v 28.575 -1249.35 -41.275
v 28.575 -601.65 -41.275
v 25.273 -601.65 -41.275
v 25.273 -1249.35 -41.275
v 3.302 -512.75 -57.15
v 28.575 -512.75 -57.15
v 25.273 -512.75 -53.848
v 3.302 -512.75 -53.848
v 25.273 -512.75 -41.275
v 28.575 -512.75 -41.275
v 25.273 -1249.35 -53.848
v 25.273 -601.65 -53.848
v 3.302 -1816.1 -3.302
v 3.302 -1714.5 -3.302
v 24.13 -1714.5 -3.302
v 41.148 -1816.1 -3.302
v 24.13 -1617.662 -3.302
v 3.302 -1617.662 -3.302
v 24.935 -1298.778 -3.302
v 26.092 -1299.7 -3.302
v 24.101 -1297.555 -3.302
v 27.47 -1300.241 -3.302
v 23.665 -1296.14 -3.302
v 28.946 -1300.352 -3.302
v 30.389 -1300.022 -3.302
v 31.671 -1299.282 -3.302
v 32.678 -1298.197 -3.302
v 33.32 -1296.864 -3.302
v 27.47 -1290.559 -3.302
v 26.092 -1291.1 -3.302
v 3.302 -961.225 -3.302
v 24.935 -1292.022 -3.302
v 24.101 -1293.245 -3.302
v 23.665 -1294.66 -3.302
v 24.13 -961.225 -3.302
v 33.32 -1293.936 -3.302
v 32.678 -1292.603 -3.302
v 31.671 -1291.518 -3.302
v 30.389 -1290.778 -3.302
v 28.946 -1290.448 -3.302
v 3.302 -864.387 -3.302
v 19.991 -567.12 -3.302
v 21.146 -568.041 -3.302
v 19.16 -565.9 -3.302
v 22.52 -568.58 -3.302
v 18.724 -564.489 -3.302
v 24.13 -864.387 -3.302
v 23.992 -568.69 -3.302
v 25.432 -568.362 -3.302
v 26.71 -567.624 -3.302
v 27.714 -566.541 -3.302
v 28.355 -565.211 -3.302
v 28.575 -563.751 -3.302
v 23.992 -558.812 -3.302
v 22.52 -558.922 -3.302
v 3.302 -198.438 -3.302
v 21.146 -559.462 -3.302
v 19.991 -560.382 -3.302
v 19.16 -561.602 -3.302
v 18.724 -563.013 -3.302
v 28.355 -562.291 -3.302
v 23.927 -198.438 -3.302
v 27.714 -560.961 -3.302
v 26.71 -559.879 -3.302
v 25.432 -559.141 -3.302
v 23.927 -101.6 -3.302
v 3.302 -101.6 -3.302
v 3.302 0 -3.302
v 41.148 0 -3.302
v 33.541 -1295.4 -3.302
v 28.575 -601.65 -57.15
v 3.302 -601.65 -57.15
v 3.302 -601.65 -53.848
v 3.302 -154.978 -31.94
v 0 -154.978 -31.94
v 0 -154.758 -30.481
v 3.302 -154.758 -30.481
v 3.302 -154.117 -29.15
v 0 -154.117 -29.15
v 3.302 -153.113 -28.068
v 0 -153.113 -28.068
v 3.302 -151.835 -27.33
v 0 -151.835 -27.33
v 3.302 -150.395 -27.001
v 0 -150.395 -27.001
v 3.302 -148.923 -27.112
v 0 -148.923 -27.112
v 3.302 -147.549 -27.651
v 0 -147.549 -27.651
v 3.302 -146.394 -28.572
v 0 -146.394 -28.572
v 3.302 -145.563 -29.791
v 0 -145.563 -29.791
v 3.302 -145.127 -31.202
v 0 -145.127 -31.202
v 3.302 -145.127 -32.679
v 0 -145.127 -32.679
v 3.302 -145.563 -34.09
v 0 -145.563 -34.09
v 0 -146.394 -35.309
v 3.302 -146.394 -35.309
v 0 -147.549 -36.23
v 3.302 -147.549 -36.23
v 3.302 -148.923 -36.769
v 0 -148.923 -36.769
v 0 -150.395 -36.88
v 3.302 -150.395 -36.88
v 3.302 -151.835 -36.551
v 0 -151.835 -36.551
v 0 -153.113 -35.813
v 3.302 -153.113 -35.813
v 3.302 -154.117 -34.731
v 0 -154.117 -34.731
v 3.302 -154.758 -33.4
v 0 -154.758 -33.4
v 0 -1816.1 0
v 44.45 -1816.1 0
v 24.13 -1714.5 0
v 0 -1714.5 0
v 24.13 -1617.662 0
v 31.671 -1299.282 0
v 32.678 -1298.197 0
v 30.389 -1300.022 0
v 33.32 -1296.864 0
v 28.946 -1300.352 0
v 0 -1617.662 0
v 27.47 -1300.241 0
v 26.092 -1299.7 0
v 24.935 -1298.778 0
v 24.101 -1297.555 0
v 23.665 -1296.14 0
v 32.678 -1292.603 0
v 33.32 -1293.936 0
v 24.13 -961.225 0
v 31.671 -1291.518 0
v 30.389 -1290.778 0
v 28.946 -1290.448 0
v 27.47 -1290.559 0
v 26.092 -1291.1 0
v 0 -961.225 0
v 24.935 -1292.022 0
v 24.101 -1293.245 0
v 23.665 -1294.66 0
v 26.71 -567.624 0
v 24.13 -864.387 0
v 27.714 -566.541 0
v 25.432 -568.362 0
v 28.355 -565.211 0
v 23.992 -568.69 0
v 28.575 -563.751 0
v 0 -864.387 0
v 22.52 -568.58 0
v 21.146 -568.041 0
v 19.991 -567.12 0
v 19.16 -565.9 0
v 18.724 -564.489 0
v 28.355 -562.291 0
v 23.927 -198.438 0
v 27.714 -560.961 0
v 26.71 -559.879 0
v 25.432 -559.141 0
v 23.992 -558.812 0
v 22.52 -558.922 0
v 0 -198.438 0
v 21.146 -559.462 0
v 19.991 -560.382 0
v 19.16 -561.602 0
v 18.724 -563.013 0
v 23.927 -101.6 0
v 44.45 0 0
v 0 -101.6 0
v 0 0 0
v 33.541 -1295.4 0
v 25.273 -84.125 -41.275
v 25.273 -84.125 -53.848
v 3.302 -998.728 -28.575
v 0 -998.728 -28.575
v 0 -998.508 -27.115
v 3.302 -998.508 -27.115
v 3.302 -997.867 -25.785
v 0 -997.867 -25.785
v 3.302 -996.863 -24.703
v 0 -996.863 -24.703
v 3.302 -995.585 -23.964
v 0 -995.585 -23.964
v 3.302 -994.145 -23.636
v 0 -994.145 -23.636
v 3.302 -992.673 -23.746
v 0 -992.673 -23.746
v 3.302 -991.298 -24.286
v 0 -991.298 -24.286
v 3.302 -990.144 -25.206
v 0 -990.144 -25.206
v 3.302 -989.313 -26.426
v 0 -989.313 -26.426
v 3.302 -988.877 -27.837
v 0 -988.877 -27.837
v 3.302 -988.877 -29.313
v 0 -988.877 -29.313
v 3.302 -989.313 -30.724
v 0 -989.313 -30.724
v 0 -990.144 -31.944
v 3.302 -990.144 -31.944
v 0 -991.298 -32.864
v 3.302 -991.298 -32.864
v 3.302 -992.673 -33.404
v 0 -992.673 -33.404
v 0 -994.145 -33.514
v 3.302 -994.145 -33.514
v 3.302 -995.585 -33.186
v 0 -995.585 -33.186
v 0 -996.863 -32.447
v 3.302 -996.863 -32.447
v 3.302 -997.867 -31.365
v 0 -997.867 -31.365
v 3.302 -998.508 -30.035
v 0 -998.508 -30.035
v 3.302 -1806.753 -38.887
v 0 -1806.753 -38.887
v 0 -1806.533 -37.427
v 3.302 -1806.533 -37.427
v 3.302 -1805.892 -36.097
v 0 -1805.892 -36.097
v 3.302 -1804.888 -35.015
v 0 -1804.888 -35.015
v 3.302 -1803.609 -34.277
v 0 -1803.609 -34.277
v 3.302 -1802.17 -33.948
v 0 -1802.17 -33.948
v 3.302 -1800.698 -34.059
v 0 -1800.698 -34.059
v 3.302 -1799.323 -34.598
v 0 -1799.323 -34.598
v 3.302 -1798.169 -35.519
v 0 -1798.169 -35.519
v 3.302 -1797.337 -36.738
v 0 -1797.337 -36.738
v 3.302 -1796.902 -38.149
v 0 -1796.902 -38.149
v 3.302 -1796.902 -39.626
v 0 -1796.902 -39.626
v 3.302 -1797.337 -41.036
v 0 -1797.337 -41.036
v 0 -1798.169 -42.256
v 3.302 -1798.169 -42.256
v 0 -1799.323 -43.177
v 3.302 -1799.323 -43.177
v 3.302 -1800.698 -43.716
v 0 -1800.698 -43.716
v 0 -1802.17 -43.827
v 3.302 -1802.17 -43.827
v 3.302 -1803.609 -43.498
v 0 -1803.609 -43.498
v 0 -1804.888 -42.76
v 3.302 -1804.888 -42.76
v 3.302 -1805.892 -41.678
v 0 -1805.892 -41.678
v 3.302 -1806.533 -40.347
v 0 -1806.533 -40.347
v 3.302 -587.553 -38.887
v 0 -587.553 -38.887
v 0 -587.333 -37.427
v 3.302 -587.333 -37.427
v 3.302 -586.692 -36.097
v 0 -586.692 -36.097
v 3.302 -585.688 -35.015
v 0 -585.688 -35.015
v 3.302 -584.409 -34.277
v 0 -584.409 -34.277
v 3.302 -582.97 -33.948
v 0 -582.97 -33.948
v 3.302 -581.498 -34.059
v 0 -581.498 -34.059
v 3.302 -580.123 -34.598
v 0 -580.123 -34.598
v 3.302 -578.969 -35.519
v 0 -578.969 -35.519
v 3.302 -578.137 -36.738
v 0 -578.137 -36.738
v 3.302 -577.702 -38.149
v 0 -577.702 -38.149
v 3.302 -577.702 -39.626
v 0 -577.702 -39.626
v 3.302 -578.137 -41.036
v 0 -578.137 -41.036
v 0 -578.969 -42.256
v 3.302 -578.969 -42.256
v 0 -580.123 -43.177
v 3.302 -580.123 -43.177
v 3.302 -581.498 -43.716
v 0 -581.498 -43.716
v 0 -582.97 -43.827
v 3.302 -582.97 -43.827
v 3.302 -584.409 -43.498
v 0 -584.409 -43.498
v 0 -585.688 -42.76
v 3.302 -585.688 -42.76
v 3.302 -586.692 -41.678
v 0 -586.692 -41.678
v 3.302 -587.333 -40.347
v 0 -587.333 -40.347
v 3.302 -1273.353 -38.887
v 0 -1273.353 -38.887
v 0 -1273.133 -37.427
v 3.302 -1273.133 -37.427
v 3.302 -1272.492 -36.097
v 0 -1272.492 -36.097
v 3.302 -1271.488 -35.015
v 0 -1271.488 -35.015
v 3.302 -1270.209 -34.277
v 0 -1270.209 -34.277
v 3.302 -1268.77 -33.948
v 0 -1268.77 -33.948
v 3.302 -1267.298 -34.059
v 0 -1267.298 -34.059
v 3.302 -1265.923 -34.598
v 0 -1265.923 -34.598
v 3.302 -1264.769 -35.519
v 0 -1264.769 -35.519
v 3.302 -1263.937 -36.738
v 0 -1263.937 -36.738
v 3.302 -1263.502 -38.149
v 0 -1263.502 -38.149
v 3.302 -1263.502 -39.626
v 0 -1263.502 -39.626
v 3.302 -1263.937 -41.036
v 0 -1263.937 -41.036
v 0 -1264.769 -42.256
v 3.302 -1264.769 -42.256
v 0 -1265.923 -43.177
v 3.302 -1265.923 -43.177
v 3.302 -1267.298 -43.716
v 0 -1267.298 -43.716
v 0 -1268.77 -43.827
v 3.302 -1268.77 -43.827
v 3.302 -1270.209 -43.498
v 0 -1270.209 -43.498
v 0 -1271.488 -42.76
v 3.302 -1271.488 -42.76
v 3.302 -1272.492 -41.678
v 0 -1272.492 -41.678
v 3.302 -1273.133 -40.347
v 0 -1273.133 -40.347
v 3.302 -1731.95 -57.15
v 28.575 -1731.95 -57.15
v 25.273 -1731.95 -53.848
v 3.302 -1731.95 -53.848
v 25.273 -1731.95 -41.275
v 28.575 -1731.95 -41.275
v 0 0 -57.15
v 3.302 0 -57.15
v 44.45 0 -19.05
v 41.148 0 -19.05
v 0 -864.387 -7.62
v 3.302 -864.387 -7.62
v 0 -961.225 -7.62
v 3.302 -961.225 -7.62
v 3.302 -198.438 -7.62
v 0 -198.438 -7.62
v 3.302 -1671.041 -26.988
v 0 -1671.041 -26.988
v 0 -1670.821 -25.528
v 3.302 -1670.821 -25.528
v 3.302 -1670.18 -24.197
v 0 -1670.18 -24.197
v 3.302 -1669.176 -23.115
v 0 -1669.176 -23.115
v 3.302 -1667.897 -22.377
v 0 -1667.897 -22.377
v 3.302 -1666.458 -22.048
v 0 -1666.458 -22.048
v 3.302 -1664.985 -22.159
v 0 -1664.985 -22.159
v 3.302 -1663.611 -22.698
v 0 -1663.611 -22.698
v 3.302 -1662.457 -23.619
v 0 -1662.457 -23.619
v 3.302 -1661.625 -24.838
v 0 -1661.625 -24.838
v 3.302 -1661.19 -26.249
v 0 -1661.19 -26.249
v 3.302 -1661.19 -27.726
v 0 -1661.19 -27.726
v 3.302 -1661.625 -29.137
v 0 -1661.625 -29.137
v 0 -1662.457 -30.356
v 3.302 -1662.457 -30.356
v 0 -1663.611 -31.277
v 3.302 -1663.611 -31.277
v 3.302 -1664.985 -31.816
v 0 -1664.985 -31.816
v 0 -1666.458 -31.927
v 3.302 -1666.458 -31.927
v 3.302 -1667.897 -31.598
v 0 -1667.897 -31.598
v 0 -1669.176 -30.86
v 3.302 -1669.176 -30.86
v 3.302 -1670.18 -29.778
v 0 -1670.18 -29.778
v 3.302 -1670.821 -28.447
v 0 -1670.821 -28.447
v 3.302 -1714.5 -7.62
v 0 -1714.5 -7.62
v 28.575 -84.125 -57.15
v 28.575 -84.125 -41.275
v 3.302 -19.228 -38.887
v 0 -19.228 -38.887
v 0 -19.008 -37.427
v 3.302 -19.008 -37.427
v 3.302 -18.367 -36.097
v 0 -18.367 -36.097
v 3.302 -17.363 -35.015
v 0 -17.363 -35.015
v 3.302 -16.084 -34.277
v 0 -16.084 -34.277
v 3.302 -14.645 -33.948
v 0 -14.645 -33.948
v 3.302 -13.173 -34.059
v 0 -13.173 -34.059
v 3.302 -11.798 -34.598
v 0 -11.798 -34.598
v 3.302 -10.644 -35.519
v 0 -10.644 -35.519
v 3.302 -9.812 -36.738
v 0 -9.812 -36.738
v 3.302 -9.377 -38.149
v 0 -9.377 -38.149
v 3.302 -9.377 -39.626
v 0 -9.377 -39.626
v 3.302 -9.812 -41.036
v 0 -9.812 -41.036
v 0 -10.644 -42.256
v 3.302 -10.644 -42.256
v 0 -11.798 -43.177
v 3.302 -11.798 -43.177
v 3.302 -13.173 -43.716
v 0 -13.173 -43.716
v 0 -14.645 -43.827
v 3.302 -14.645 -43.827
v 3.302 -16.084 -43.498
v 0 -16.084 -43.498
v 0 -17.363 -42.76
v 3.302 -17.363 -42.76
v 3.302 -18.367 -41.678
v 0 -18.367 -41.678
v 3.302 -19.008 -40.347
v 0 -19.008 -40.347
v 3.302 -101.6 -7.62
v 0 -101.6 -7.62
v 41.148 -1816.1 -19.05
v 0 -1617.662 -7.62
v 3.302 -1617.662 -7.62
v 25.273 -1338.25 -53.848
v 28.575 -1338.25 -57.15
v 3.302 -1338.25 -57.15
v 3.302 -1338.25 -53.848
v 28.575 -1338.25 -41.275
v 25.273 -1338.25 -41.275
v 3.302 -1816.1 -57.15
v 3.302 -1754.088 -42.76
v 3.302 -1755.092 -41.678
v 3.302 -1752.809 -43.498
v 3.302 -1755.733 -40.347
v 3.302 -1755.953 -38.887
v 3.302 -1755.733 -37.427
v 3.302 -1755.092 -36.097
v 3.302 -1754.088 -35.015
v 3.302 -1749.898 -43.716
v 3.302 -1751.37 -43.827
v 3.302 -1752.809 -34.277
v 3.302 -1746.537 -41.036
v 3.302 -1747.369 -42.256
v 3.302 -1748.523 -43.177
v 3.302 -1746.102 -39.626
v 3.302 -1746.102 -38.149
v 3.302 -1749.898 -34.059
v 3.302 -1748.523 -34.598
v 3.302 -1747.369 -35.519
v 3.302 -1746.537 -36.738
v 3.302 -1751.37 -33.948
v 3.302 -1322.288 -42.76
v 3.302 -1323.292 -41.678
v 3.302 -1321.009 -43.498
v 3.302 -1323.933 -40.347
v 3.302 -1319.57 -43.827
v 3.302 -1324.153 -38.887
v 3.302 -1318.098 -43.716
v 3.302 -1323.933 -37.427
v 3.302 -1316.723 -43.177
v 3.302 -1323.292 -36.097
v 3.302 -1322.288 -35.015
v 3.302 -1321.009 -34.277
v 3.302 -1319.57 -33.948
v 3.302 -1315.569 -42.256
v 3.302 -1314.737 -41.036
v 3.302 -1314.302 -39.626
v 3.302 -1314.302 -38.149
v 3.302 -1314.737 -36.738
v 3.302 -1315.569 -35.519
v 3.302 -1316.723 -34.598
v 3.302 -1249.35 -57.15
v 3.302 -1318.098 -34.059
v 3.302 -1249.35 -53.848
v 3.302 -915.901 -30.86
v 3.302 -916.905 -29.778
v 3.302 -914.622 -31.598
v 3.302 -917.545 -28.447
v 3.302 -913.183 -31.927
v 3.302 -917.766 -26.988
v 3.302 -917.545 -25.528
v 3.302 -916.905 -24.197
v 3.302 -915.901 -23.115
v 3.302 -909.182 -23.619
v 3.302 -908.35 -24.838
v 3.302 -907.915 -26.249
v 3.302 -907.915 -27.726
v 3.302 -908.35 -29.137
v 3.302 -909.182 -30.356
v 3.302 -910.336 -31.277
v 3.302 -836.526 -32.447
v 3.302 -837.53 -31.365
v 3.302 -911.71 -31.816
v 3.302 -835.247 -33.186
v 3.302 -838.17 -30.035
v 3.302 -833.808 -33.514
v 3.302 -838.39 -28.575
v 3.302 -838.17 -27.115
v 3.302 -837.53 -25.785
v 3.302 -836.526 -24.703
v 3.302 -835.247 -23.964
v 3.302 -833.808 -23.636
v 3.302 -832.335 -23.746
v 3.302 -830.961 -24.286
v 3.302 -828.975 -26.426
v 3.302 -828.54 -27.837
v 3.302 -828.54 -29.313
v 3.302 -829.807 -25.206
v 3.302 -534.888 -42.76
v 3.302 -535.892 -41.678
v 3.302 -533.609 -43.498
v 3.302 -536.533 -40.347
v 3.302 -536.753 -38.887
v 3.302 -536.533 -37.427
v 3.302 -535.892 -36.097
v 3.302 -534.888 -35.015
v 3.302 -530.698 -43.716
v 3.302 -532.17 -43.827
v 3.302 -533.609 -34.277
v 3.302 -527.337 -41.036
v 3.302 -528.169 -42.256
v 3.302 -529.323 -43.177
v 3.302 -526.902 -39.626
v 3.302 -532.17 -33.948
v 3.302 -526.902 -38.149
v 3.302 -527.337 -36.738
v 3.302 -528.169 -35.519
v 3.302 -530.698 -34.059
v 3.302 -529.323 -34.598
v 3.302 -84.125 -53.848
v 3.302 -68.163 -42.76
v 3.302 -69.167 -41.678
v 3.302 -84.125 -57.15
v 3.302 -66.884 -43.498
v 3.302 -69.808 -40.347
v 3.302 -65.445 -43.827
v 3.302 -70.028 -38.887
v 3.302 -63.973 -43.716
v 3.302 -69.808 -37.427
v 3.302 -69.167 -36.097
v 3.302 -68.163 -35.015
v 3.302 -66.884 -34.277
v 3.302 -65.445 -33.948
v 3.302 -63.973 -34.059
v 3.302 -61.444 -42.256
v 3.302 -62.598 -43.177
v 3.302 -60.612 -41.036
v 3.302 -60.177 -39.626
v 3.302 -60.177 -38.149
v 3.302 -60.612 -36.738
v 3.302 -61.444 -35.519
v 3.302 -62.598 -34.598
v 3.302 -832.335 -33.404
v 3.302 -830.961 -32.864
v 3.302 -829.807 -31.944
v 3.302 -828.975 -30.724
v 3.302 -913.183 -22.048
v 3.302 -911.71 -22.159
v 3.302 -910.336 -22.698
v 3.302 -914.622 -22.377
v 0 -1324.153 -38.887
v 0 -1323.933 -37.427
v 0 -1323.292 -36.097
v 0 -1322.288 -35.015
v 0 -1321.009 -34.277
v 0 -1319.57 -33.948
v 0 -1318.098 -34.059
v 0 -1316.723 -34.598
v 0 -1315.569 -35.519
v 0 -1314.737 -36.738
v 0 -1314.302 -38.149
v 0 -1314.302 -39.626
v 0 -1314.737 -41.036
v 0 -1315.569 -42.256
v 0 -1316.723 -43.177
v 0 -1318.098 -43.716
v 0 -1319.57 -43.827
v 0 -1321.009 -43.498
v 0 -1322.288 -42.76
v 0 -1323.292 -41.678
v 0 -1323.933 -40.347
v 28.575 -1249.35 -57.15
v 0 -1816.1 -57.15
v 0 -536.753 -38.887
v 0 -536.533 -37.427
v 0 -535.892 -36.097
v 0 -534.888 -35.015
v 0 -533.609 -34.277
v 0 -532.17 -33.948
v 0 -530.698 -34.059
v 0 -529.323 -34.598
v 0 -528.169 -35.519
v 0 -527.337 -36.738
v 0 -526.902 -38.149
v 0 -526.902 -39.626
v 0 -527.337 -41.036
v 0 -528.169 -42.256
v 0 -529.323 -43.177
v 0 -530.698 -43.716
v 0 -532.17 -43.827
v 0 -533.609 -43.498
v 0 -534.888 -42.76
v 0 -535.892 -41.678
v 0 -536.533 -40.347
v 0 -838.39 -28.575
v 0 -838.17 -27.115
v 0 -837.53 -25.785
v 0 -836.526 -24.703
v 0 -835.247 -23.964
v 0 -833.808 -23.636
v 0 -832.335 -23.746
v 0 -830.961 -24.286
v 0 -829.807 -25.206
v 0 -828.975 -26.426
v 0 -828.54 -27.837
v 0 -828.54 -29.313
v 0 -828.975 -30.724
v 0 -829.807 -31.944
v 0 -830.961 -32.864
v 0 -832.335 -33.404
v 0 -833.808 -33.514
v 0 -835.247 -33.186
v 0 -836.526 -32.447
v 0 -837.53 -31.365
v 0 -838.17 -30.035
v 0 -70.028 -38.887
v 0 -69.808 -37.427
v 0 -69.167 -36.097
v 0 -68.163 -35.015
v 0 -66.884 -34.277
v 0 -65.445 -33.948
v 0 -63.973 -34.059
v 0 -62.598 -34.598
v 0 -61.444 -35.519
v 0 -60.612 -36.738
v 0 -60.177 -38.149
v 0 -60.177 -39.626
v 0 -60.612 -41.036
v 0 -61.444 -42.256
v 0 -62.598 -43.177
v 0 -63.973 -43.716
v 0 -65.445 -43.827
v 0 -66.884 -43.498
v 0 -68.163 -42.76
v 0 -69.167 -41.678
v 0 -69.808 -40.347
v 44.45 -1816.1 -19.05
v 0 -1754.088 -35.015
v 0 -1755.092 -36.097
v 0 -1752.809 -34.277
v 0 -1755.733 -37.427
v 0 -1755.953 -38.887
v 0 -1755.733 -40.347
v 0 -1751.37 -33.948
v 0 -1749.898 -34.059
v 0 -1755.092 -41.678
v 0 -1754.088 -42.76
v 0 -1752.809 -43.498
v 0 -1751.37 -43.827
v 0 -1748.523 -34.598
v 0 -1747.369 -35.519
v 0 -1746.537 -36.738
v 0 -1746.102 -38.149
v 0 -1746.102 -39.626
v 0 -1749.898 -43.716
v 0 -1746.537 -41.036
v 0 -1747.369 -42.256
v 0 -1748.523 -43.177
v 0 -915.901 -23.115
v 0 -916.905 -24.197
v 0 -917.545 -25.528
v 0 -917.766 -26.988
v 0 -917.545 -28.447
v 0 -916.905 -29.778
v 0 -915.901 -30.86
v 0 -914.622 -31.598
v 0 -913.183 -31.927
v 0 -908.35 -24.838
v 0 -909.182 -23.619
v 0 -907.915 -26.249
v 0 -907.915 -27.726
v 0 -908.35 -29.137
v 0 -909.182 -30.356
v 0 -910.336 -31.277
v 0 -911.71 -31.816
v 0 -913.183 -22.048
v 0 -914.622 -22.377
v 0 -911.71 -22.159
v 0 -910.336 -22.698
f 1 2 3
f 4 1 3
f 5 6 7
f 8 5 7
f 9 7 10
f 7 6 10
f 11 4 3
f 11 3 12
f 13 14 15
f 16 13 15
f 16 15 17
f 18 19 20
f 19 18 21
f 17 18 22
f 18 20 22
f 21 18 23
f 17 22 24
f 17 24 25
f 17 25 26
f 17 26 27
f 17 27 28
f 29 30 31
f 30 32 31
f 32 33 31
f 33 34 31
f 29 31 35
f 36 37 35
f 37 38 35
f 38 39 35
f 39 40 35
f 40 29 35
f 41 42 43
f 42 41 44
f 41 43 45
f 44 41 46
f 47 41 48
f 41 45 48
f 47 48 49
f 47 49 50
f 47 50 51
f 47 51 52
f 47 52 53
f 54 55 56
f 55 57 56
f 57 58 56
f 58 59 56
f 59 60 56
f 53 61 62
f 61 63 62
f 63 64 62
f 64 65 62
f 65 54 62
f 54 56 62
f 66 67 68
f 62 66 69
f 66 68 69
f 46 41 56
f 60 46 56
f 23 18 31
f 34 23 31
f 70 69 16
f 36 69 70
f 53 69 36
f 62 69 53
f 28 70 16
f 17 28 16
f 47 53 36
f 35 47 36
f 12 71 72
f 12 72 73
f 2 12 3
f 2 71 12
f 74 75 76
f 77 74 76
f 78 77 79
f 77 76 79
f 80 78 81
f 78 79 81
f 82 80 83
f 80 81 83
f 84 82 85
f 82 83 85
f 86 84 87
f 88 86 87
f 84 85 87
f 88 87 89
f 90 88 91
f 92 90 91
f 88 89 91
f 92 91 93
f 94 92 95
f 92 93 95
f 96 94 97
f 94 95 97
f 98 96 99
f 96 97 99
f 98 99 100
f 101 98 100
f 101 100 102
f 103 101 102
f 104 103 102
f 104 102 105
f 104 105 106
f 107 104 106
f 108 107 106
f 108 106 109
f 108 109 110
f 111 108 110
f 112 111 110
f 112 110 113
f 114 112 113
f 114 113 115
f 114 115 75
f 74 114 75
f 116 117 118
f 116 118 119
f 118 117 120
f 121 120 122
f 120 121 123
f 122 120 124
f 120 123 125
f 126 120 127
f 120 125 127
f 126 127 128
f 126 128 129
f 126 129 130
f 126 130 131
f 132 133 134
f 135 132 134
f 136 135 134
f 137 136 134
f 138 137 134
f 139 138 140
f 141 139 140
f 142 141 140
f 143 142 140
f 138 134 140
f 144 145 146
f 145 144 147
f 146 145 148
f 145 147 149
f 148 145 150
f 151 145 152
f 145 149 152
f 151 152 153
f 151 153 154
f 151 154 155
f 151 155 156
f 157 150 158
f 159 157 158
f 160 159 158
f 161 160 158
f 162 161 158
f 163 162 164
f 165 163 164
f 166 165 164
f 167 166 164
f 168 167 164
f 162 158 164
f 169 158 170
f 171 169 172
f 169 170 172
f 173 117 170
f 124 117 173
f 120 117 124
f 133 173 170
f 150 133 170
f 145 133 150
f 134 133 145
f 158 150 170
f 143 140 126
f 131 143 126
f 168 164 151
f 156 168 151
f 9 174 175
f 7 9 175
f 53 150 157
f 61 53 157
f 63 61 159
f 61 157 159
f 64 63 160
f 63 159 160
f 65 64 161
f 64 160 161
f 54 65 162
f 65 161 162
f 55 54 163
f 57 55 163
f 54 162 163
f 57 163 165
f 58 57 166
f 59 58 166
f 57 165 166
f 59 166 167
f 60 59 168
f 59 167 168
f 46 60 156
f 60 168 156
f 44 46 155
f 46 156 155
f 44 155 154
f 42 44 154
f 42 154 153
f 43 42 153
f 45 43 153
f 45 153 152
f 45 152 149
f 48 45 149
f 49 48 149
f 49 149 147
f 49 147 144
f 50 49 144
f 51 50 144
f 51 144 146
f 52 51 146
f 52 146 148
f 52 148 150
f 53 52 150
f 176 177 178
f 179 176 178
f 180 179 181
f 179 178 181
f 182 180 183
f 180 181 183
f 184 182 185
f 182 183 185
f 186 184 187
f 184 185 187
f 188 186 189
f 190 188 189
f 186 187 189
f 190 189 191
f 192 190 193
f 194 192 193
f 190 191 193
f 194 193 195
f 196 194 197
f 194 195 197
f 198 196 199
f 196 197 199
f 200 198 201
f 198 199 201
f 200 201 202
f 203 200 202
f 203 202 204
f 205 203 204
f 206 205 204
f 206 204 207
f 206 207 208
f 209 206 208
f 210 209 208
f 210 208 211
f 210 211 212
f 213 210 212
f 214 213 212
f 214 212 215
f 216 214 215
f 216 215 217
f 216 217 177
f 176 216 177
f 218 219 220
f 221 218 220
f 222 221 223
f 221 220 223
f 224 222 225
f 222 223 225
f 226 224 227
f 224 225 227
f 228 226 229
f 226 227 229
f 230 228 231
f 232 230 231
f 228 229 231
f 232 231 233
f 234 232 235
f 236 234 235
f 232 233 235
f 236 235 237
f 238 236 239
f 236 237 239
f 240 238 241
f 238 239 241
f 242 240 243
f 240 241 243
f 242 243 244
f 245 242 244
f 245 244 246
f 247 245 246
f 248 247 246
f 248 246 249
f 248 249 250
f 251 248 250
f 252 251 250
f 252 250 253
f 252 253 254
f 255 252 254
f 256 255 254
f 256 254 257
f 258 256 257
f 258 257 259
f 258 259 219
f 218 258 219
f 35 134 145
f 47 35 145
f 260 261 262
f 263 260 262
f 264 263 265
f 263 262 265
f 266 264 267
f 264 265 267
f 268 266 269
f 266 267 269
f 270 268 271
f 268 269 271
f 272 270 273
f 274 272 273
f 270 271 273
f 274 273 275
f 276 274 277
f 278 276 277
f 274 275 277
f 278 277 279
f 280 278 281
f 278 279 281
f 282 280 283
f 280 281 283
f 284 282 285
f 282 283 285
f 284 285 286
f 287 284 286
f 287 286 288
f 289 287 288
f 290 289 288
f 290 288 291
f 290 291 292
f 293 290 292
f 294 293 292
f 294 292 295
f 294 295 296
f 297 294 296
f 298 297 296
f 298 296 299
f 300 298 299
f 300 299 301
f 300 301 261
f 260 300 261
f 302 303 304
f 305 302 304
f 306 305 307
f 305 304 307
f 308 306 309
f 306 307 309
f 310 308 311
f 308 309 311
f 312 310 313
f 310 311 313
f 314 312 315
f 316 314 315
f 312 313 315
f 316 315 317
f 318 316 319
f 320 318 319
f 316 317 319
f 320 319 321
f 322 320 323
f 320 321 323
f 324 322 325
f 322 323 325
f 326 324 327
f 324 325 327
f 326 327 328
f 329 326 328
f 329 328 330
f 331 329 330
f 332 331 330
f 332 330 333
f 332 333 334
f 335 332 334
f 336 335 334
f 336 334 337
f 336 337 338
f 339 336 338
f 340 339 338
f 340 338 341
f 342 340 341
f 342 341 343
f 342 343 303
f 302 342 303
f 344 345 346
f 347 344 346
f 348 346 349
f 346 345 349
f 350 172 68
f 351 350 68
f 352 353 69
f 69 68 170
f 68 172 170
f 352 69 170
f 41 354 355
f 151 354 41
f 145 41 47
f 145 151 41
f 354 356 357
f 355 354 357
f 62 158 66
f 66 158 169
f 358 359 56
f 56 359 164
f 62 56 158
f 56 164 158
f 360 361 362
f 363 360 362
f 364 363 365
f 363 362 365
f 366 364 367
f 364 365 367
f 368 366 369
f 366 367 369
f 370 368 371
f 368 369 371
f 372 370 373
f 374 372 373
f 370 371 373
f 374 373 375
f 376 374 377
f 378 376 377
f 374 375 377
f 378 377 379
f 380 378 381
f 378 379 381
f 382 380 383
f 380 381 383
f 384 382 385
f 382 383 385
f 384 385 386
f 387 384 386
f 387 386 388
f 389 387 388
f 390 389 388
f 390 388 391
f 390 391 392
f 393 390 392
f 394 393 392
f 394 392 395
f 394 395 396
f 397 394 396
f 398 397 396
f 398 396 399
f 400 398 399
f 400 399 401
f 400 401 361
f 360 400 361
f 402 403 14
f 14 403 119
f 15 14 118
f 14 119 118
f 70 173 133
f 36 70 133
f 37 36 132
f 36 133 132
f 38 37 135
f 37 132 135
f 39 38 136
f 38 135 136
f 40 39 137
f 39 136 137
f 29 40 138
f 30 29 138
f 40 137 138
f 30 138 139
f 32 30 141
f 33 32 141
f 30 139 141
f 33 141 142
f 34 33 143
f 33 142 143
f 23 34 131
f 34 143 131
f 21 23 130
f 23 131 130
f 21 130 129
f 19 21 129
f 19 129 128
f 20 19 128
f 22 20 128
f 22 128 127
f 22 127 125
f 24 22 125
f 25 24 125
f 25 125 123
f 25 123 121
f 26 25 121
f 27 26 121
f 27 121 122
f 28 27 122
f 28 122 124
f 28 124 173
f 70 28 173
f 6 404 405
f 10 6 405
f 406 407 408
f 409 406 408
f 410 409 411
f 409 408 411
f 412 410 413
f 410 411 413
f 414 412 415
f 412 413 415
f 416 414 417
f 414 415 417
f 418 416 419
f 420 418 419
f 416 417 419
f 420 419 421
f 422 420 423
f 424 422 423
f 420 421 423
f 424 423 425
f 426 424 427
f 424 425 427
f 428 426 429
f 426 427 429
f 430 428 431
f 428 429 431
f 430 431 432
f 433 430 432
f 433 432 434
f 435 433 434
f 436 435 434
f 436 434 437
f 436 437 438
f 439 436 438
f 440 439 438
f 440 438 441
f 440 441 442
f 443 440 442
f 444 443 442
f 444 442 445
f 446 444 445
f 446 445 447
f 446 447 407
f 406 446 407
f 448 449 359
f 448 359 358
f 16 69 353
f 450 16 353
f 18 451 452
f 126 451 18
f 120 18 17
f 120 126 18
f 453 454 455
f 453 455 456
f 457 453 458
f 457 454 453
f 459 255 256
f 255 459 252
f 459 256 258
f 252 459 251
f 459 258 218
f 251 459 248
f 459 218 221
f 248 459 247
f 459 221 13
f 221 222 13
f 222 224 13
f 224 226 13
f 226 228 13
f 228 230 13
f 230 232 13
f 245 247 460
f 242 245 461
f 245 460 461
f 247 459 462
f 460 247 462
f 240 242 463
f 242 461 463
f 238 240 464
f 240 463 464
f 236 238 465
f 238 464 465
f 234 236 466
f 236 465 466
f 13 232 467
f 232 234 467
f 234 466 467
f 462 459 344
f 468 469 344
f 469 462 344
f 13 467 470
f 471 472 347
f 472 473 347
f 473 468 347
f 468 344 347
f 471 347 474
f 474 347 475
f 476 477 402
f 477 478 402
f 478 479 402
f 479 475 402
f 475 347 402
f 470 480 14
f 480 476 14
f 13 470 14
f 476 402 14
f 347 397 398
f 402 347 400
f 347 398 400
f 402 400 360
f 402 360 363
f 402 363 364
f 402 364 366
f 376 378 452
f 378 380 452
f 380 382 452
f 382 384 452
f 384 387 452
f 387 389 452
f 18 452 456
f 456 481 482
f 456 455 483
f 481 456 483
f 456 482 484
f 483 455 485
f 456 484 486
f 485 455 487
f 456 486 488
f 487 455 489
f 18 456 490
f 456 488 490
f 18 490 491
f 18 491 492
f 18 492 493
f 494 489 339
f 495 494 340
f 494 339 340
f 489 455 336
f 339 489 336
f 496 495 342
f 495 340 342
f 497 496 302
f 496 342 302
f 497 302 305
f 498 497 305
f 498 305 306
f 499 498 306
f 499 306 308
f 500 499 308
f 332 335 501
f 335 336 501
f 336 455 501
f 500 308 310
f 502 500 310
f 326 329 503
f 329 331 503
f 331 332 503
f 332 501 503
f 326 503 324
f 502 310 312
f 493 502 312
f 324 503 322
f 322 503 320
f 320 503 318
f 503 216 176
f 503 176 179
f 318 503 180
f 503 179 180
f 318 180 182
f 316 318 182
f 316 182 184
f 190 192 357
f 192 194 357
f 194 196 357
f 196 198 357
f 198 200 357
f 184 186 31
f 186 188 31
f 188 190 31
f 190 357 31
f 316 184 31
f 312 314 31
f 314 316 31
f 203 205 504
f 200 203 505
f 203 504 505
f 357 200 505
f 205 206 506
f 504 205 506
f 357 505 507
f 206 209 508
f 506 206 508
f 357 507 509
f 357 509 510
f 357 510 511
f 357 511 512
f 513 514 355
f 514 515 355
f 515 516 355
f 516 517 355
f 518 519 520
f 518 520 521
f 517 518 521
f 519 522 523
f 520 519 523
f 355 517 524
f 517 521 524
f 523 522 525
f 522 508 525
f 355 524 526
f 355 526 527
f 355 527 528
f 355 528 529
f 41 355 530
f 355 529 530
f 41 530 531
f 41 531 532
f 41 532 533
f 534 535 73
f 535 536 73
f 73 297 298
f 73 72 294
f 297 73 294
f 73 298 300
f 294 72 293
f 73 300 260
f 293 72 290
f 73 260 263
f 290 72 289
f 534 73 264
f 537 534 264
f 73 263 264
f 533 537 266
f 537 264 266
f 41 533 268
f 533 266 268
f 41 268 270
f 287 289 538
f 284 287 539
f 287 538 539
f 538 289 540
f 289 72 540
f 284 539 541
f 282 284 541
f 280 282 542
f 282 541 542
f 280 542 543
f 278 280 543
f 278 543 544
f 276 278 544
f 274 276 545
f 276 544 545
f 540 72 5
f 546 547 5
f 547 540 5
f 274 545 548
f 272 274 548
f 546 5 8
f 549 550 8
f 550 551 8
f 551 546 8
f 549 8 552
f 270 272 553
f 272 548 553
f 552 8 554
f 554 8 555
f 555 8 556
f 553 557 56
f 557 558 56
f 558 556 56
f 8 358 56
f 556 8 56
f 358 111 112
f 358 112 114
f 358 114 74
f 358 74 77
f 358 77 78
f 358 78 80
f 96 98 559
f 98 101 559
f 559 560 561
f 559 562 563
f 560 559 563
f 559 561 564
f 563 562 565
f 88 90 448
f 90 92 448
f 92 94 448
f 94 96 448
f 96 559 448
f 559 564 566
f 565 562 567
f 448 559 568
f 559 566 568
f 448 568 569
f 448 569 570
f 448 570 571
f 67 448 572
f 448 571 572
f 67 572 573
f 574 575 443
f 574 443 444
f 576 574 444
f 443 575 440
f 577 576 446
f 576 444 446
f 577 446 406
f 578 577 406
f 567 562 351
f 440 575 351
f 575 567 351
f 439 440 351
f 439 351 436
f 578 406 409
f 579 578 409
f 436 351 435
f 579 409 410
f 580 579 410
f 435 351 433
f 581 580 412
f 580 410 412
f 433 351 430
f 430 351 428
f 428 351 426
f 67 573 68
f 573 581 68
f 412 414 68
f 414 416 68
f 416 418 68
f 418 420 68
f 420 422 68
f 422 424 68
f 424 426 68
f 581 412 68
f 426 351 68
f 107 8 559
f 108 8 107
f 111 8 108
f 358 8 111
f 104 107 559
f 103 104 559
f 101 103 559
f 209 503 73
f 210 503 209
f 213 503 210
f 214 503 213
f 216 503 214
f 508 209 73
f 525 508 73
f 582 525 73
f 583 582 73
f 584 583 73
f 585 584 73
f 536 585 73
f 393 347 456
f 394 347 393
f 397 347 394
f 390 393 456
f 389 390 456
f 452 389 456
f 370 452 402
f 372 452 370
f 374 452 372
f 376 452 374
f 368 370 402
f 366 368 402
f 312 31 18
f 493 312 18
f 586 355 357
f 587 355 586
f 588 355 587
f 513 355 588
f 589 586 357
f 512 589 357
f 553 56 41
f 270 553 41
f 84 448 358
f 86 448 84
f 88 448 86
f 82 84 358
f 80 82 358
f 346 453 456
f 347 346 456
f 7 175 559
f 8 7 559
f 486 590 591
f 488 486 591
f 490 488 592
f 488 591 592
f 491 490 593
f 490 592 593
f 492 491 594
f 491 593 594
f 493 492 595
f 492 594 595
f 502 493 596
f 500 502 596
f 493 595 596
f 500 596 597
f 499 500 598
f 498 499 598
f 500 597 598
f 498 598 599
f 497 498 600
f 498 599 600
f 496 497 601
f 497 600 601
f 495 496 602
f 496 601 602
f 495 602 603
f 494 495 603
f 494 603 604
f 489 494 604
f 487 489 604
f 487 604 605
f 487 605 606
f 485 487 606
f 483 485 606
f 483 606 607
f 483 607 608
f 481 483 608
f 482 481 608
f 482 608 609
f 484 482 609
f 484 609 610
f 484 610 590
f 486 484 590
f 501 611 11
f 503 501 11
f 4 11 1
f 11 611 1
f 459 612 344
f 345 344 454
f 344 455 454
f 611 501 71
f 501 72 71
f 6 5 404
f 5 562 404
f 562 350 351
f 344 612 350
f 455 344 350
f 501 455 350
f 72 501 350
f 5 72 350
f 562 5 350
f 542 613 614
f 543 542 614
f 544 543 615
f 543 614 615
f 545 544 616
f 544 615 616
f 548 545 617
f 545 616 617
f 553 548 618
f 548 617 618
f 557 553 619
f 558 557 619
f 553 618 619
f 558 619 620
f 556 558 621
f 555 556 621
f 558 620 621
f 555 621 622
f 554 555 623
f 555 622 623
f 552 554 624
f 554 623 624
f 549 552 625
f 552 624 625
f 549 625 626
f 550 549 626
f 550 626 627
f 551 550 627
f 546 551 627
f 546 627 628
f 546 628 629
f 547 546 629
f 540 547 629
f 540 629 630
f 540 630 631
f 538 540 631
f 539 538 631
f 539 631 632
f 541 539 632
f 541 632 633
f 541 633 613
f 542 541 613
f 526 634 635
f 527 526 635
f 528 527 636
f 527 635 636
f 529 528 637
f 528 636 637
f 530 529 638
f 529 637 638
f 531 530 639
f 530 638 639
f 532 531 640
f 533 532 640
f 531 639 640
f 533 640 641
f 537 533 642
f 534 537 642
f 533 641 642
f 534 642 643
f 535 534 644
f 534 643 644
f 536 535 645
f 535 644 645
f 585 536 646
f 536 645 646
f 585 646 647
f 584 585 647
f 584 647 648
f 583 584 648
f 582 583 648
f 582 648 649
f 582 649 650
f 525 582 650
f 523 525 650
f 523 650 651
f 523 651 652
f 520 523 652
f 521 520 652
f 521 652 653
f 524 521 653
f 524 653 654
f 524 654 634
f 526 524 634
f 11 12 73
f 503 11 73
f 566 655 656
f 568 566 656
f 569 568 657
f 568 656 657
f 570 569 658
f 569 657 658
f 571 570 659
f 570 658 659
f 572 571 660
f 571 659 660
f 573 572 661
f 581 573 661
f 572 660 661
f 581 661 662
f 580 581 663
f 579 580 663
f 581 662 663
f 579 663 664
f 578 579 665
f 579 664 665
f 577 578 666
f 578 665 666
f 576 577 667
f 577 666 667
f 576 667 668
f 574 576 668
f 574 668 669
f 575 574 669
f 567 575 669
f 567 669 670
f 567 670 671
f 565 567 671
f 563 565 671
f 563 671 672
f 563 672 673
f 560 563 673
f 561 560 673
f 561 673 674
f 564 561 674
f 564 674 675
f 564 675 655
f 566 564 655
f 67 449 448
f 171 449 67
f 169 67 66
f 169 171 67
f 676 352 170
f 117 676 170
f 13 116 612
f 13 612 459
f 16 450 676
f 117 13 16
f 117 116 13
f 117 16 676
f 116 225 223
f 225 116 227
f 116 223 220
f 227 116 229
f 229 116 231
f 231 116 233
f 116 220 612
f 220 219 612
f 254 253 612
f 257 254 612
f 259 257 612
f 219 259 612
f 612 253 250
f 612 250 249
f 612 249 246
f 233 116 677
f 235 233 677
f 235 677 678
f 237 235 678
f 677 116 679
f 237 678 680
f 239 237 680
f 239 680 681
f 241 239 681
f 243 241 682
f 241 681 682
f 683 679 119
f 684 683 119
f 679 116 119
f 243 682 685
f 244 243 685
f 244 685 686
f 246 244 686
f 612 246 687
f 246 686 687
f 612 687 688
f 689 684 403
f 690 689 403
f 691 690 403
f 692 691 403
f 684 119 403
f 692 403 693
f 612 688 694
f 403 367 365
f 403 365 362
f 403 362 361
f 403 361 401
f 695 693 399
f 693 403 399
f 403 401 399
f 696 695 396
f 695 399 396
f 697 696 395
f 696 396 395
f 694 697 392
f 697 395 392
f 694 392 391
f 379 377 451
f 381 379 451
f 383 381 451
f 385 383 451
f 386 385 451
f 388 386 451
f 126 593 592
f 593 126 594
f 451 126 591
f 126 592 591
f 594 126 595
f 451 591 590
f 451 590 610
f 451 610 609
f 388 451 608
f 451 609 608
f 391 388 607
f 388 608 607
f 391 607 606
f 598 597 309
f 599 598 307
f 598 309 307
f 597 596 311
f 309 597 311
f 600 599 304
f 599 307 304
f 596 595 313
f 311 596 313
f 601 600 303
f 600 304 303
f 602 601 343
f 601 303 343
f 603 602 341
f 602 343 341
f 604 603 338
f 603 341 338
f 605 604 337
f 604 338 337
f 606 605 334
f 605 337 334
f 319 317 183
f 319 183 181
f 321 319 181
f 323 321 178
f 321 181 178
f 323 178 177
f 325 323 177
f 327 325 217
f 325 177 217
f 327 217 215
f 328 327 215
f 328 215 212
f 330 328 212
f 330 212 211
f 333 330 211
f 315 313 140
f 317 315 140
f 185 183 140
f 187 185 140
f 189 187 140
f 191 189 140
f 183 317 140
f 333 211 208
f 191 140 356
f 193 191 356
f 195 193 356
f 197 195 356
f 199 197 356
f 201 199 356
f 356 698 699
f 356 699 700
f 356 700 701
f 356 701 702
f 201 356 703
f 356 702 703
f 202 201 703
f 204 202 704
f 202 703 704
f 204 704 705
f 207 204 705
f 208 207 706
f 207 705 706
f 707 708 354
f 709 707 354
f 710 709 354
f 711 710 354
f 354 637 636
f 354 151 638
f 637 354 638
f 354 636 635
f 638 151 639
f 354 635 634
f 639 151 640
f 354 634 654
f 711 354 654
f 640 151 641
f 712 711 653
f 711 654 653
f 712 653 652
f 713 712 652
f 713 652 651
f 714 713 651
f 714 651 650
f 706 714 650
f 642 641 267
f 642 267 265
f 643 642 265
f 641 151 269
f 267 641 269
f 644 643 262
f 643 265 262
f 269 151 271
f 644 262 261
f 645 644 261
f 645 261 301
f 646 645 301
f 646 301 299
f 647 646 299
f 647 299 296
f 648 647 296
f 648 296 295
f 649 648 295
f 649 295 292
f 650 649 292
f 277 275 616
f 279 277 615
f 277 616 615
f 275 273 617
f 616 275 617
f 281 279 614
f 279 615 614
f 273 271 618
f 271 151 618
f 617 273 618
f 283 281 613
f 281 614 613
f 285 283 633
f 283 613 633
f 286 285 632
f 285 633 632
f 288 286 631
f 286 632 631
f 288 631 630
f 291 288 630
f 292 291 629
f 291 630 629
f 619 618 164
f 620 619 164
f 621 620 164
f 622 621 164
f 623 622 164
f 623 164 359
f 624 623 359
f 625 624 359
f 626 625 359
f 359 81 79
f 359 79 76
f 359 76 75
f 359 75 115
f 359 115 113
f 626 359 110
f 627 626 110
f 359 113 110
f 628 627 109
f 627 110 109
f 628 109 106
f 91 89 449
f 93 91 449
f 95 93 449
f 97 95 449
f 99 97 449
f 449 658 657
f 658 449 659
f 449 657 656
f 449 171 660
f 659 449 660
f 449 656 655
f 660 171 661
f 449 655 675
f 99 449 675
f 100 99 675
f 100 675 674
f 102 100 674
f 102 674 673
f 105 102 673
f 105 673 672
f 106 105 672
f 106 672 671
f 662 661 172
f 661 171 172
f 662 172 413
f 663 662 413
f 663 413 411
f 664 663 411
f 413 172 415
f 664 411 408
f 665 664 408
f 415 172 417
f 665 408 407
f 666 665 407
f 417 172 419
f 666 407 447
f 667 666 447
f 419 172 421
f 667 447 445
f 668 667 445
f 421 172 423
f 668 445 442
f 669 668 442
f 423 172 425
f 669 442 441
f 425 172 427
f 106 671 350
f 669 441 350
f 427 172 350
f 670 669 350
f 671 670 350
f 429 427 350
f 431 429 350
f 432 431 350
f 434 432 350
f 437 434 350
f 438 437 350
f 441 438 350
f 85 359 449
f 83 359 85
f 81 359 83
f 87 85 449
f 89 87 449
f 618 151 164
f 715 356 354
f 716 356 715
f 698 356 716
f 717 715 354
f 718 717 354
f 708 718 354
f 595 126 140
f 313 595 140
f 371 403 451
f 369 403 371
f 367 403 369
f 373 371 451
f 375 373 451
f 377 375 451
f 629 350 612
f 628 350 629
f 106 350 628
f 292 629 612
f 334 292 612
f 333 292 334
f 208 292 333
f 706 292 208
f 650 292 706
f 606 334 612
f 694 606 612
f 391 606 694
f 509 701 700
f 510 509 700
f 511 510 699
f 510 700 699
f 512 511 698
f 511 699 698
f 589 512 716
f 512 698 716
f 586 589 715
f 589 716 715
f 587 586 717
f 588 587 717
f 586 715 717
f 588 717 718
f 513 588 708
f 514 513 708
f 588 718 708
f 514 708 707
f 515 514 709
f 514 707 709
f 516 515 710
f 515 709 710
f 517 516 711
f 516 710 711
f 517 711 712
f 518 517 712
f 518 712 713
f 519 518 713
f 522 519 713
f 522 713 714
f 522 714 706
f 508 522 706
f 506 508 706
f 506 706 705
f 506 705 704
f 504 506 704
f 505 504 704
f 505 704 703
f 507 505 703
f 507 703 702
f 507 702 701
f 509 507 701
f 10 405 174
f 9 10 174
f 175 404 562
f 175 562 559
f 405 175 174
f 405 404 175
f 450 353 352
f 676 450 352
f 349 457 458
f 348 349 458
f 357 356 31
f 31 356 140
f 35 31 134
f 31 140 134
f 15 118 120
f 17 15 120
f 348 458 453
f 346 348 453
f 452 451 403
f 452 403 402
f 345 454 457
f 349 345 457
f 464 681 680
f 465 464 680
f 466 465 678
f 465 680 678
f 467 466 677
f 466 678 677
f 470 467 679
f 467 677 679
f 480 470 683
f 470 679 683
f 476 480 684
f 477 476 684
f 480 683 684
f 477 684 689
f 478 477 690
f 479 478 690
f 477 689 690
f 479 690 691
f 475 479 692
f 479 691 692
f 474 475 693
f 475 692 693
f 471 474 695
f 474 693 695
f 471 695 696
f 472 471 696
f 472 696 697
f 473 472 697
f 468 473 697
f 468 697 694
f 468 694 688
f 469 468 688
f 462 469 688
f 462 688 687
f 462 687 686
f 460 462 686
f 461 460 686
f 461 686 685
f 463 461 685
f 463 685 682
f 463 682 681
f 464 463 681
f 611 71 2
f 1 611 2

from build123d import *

# Parameters (mm, degrees)
F1_DEPTH  = 1816.1
F2_R      = 4.953
F2_R_2    = 4.9657
F3_DEPTH  = 25.4
F4_R      = 4.953
F5_DEPTH  = 25.4
F6_R      = 4.953
F7_DEPTH  = 25.4
F8_W      = 23.9268
F8_H      = 96.8375
F8_W_2    = 24.13
F9_DEPTH  = 7.62
F10_R     = 4.953
F11_DEPTH = 25.4
F12_W     = 84.1502
F12_H     = 15.875
F12_W_2   = 88.9
F12_W_3   = 84.1248
F13_DEPTH = 25.273


with BuildPart() as f1:
    # F0 (on Front) → F1 (new body)
    with BuildSketch(Plane.XZ):
        Polygon((44.45, 0), (0, 0), (0, -57.15), (28.575, -57.15), (28.575, -41.275), (25.273, -41.275), (25.273, -53.848), (3.302, -53.848), (3.302, -3.302), (41.148, -3.302), (41.148, -19.05), (44.45, -19.05), align=None)
    extrude(amount=F1_DEPTH)

    # F2 (on face) → F3 (cut)
    with BuildSketch(Plane.XY):
        with Locations((23.622, -563.751269)):
            Circle(F2_R)
        with Locations((28.575, -1295.4)):
            Circle(F2_R_2)
    extrude(amount=-F3_DEPTH, mode=Mode.SUBTRACT)

    # F4 (on face) → F5 (cut)
    with BuildSketch(Plane(origin=(0, 0, 0), x_dir=(0, -1, 0), z_dir=(-1, 0, 0))):
        with Locations((14.2748, -38.8874)):
            Circle(F4_R)
        with Locations((65.0748, -38.8874)):
            Circle(F4_R)
        with Locations((531.7998, -38.8874)):
            Circle(F4_R)
        with Locations((582.5998, -38.8874)):
            Circle(F4_R)
        with Locations((1268.3998, -38.8874)):
            Circle(F4_R)
        with Locations((1319.1998, -38.8874)):
            Circle(F4_R)
        with Locations((1750.9998, -38.8874)):
            Circle(F4_R)
        with Locations((1801.7998, -38.8874)):
            Circle(F4_R)
    extrude(amount=-F5_DEPTH, mode=Mode.SUBTRACT)

    # F6 (on face) → F7 (cut)
    with BuildSketch(Plane(origin=(0, 0, 0), x_dir=(0, -1, 0), z_dir=(-1, 0, 0))):
        with Locations((833.4375, -28.575)):
            Circle(F6_R)
        with Locations((993.775, -28.575)):
            Circle(F6_R)
    extrude(amount=-F7_DEPTH, mode=Mode.SUBTRACT)

    # F8 (on face) → F9 (cut)
    with BuildSketch(Plane.XY):
        with Locations((11.9634, -150.01875)):
            Rectangle(F8_W, F8_H)
        with Locations((12.065, -1666.08125)):
            Rectangle(F8_W_2, F8_H)
        with Locations((12.065, -912.80615)):
            Rectangle(F8_W_2, F8_H)
    extrude(amount=-F9_DEPTH, mode=Mode.SUBTRACT)

    # F10 (on face) → F11 (cut)
    with BuildSketch(Plane(origin=(0, 0, 0), x_dir=(0, -1, 0), z_dir=(-1, 0, 0))):
        with Locations((150.0251, -31.9405)):
            Circle(F10_R)
        with Locations((912.8125, -26.9875)):
            Circle(F10_R)
        with Locations((1666.0876, -26.9875)):
            Circle(F10_R)
    extrude(amount=-F11_DEPTH, mode=Mode.SUBTRACT)

    # F12 (on face) → F13 (cut, through all)
    with BuildSketch(Plane.YZ.offset(28.575)):
        with Locations((-1774.0249, -49.2125)):
            Rectangle(F12_W, F12_H)
        with Locations((-1293.7998, -49.2125)):
            Rectangle(F12_W_2, F12_H)
        with Locations((-557.1998, -49.2125)):
            Rectangle(F12_W_2, F12_H)
        with Locations((-42.0624, -49.2125)):
            Rectangle(F12_W_3, F12_H)
    extrude(amount=-F13_DEPTH, mode=Mode.SUBTRACT)


solid = f1.part
